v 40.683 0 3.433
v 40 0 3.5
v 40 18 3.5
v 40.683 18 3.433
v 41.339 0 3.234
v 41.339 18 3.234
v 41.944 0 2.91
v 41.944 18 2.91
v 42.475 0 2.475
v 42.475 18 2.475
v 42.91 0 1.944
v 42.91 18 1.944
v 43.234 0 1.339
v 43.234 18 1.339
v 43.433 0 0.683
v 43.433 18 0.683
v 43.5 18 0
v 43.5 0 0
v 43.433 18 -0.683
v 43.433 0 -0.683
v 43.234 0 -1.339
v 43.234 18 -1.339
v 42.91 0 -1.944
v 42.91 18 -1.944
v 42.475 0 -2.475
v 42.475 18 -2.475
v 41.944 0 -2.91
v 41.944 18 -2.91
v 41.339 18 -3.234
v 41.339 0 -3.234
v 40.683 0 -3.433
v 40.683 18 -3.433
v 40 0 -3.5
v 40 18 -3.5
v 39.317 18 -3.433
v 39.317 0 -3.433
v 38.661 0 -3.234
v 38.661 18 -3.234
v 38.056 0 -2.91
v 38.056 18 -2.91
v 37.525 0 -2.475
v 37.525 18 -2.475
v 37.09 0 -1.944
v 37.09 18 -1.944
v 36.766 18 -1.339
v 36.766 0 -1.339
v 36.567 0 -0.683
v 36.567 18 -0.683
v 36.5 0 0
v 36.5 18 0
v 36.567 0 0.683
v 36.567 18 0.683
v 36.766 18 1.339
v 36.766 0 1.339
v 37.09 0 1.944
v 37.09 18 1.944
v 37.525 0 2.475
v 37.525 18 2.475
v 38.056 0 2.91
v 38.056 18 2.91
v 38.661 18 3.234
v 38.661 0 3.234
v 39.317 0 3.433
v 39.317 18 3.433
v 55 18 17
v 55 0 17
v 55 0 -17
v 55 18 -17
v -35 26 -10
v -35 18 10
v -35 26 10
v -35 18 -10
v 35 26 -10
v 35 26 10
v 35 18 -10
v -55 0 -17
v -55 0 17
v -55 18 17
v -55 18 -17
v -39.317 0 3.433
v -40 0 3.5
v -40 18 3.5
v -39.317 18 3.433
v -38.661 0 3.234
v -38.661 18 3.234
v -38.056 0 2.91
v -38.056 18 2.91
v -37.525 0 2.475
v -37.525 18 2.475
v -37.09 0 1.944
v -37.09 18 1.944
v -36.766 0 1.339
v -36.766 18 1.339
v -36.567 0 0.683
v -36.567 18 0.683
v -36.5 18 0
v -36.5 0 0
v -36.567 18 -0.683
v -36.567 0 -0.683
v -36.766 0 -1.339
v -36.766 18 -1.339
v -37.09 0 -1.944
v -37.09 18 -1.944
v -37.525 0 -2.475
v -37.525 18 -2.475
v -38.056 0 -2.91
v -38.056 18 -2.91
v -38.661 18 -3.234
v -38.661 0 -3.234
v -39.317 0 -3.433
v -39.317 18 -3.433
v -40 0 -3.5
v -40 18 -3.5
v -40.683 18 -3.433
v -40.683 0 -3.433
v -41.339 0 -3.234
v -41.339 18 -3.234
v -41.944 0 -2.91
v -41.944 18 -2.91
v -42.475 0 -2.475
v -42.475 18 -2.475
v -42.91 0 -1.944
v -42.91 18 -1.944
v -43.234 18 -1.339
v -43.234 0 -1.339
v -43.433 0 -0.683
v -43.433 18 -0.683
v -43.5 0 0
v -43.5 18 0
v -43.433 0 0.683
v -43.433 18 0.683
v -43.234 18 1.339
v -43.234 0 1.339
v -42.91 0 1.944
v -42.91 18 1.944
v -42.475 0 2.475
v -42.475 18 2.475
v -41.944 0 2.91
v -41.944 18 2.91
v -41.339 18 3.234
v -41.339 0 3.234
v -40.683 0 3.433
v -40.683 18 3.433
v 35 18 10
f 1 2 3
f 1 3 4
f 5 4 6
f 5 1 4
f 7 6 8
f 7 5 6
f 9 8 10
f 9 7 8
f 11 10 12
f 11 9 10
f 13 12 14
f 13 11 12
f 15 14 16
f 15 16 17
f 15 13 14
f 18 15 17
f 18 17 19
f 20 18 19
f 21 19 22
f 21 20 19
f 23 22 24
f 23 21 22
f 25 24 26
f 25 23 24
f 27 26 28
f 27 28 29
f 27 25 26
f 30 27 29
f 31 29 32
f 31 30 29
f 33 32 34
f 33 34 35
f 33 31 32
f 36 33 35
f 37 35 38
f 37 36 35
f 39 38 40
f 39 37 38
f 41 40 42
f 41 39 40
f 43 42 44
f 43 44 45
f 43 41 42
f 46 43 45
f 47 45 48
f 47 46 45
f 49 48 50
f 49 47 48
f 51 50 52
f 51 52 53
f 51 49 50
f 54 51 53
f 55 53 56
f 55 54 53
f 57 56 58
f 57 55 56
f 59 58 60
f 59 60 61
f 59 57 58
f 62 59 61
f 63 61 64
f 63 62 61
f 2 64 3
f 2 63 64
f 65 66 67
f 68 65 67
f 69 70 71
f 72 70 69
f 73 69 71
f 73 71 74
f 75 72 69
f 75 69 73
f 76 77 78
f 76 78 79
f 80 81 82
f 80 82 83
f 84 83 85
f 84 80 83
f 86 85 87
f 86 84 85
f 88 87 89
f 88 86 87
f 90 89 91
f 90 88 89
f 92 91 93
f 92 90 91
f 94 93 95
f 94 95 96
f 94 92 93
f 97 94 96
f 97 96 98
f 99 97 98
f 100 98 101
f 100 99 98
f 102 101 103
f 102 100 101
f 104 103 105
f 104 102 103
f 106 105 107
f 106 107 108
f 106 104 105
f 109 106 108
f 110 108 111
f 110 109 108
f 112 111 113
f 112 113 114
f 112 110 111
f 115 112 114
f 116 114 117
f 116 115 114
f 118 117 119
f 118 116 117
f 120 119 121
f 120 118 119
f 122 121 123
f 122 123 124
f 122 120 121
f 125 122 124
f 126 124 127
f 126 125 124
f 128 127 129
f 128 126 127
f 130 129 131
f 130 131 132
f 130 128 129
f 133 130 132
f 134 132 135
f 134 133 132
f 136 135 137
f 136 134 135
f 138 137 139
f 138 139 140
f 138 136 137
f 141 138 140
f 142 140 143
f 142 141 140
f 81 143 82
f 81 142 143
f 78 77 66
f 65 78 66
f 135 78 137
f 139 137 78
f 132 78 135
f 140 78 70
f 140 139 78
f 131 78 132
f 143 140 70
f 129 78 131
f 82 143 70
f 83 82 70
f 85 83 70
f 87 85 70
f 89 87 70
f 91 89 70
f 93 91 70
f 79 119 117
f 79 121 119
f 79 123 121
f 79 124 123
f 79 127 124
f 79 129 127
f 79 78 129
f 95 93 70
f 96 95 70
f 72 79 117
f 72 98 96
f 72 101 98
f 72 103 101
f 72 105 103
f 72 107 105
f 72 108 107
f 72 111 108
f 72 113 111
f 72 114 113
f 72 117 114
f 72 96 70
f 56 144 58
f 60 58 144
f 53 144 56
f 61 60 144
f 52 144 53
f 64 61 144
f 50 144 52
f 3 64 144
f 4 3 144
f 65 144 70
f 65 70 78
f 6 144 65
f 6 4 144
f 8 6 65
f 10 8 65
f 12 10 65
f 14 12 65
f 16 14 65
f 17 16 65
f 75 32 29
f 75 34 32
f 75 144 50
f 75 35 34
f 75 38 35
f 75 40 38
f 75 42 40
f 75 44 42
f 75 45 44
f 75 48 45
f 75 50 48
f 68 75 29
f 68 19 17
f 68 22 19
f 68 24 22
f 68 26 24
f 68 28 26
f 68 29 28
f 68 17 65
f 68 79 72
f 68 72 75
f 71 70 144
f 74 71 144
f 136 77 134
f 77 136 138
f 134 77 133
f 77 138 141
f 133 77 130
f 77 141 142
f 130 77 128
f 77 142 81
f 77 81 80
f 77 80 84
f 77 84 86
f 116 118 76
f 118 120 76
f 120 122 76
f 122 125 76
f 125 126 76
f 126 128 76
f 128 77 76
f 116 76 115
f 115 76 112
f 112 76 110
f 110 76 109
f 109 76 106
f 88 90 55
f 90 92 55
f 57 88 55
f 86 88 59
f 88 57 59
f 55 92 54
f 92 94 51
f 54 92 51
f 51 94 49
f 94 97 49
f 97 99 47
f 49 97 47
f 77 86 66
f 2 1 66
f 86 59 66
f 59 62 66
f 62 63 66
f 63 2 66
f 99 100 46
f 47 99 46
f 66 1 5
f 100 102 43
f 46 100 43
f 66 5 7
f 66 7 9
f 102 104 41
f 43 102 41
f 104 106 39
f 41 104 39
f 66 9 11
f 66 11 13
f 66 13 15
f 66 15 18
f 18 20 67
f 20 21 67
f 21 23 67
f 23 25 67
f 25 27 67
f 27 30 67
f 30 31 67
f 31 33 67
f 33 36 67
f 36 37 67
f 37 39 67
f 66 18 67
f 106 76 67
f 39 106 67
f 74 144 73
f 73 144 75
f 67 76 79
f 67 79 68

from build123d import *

# Parameters (mm, degrees)
F_01_BASE_PROFILE_W           = 110
F_01_BASE_PROFILE_H           = 34
F_01_BASE_PROFILE_R           = 3.5
F_01_BASE_EXTRUDE_DEPTH       = 18
F_02_BOSS_PROFILE_W           = 70
F_02_BOSS_PROFILE_H           = 20
F_02_REINFORCEMENT_BOSS_DEPTH = 26


with BuildPart() as part:
    # 01_Base_Profile → 01_Base_Extrude (new body)
    with BuildSketch(Plane(origin=(0, 0, 0), x_dir=(1, 0, 0), z_dir=(0, 1, 0))):
        Rectangle(F_01_BASE_PROFILE_W, F_01_BASE_PROFILE_H)
        with Locations(Location((-40, 0, 0), (0, 0, 270))):
            Circle(F_01_BASE_PROFILE_R, mode=Mode.SUBTRACT)
        with Locations(Location((40, 0, 0), (0, 0, 270))):
            Circle(F_01_BASE_PROFILE_R, mode=Mode.SUBTRACT)
    extrude(amount=F_01_BASE_EXTRUDE_DEPTH)

    # 02_Boss_Profile → 02_Reinforcement_Boss (add)
    with BuildSketch(Plane(origin=(0, 0, 0), x_dir=(1, 0, 0), z_dir=(0, 1, 0))):
        Rectangle(F_02_BOSS_PROFILE_W, F_02_BOSS_PROFILE_H)
    extrude(amount=F_02_REINFORCEMENT_BOSS_DEPTH)


solid = part.part
